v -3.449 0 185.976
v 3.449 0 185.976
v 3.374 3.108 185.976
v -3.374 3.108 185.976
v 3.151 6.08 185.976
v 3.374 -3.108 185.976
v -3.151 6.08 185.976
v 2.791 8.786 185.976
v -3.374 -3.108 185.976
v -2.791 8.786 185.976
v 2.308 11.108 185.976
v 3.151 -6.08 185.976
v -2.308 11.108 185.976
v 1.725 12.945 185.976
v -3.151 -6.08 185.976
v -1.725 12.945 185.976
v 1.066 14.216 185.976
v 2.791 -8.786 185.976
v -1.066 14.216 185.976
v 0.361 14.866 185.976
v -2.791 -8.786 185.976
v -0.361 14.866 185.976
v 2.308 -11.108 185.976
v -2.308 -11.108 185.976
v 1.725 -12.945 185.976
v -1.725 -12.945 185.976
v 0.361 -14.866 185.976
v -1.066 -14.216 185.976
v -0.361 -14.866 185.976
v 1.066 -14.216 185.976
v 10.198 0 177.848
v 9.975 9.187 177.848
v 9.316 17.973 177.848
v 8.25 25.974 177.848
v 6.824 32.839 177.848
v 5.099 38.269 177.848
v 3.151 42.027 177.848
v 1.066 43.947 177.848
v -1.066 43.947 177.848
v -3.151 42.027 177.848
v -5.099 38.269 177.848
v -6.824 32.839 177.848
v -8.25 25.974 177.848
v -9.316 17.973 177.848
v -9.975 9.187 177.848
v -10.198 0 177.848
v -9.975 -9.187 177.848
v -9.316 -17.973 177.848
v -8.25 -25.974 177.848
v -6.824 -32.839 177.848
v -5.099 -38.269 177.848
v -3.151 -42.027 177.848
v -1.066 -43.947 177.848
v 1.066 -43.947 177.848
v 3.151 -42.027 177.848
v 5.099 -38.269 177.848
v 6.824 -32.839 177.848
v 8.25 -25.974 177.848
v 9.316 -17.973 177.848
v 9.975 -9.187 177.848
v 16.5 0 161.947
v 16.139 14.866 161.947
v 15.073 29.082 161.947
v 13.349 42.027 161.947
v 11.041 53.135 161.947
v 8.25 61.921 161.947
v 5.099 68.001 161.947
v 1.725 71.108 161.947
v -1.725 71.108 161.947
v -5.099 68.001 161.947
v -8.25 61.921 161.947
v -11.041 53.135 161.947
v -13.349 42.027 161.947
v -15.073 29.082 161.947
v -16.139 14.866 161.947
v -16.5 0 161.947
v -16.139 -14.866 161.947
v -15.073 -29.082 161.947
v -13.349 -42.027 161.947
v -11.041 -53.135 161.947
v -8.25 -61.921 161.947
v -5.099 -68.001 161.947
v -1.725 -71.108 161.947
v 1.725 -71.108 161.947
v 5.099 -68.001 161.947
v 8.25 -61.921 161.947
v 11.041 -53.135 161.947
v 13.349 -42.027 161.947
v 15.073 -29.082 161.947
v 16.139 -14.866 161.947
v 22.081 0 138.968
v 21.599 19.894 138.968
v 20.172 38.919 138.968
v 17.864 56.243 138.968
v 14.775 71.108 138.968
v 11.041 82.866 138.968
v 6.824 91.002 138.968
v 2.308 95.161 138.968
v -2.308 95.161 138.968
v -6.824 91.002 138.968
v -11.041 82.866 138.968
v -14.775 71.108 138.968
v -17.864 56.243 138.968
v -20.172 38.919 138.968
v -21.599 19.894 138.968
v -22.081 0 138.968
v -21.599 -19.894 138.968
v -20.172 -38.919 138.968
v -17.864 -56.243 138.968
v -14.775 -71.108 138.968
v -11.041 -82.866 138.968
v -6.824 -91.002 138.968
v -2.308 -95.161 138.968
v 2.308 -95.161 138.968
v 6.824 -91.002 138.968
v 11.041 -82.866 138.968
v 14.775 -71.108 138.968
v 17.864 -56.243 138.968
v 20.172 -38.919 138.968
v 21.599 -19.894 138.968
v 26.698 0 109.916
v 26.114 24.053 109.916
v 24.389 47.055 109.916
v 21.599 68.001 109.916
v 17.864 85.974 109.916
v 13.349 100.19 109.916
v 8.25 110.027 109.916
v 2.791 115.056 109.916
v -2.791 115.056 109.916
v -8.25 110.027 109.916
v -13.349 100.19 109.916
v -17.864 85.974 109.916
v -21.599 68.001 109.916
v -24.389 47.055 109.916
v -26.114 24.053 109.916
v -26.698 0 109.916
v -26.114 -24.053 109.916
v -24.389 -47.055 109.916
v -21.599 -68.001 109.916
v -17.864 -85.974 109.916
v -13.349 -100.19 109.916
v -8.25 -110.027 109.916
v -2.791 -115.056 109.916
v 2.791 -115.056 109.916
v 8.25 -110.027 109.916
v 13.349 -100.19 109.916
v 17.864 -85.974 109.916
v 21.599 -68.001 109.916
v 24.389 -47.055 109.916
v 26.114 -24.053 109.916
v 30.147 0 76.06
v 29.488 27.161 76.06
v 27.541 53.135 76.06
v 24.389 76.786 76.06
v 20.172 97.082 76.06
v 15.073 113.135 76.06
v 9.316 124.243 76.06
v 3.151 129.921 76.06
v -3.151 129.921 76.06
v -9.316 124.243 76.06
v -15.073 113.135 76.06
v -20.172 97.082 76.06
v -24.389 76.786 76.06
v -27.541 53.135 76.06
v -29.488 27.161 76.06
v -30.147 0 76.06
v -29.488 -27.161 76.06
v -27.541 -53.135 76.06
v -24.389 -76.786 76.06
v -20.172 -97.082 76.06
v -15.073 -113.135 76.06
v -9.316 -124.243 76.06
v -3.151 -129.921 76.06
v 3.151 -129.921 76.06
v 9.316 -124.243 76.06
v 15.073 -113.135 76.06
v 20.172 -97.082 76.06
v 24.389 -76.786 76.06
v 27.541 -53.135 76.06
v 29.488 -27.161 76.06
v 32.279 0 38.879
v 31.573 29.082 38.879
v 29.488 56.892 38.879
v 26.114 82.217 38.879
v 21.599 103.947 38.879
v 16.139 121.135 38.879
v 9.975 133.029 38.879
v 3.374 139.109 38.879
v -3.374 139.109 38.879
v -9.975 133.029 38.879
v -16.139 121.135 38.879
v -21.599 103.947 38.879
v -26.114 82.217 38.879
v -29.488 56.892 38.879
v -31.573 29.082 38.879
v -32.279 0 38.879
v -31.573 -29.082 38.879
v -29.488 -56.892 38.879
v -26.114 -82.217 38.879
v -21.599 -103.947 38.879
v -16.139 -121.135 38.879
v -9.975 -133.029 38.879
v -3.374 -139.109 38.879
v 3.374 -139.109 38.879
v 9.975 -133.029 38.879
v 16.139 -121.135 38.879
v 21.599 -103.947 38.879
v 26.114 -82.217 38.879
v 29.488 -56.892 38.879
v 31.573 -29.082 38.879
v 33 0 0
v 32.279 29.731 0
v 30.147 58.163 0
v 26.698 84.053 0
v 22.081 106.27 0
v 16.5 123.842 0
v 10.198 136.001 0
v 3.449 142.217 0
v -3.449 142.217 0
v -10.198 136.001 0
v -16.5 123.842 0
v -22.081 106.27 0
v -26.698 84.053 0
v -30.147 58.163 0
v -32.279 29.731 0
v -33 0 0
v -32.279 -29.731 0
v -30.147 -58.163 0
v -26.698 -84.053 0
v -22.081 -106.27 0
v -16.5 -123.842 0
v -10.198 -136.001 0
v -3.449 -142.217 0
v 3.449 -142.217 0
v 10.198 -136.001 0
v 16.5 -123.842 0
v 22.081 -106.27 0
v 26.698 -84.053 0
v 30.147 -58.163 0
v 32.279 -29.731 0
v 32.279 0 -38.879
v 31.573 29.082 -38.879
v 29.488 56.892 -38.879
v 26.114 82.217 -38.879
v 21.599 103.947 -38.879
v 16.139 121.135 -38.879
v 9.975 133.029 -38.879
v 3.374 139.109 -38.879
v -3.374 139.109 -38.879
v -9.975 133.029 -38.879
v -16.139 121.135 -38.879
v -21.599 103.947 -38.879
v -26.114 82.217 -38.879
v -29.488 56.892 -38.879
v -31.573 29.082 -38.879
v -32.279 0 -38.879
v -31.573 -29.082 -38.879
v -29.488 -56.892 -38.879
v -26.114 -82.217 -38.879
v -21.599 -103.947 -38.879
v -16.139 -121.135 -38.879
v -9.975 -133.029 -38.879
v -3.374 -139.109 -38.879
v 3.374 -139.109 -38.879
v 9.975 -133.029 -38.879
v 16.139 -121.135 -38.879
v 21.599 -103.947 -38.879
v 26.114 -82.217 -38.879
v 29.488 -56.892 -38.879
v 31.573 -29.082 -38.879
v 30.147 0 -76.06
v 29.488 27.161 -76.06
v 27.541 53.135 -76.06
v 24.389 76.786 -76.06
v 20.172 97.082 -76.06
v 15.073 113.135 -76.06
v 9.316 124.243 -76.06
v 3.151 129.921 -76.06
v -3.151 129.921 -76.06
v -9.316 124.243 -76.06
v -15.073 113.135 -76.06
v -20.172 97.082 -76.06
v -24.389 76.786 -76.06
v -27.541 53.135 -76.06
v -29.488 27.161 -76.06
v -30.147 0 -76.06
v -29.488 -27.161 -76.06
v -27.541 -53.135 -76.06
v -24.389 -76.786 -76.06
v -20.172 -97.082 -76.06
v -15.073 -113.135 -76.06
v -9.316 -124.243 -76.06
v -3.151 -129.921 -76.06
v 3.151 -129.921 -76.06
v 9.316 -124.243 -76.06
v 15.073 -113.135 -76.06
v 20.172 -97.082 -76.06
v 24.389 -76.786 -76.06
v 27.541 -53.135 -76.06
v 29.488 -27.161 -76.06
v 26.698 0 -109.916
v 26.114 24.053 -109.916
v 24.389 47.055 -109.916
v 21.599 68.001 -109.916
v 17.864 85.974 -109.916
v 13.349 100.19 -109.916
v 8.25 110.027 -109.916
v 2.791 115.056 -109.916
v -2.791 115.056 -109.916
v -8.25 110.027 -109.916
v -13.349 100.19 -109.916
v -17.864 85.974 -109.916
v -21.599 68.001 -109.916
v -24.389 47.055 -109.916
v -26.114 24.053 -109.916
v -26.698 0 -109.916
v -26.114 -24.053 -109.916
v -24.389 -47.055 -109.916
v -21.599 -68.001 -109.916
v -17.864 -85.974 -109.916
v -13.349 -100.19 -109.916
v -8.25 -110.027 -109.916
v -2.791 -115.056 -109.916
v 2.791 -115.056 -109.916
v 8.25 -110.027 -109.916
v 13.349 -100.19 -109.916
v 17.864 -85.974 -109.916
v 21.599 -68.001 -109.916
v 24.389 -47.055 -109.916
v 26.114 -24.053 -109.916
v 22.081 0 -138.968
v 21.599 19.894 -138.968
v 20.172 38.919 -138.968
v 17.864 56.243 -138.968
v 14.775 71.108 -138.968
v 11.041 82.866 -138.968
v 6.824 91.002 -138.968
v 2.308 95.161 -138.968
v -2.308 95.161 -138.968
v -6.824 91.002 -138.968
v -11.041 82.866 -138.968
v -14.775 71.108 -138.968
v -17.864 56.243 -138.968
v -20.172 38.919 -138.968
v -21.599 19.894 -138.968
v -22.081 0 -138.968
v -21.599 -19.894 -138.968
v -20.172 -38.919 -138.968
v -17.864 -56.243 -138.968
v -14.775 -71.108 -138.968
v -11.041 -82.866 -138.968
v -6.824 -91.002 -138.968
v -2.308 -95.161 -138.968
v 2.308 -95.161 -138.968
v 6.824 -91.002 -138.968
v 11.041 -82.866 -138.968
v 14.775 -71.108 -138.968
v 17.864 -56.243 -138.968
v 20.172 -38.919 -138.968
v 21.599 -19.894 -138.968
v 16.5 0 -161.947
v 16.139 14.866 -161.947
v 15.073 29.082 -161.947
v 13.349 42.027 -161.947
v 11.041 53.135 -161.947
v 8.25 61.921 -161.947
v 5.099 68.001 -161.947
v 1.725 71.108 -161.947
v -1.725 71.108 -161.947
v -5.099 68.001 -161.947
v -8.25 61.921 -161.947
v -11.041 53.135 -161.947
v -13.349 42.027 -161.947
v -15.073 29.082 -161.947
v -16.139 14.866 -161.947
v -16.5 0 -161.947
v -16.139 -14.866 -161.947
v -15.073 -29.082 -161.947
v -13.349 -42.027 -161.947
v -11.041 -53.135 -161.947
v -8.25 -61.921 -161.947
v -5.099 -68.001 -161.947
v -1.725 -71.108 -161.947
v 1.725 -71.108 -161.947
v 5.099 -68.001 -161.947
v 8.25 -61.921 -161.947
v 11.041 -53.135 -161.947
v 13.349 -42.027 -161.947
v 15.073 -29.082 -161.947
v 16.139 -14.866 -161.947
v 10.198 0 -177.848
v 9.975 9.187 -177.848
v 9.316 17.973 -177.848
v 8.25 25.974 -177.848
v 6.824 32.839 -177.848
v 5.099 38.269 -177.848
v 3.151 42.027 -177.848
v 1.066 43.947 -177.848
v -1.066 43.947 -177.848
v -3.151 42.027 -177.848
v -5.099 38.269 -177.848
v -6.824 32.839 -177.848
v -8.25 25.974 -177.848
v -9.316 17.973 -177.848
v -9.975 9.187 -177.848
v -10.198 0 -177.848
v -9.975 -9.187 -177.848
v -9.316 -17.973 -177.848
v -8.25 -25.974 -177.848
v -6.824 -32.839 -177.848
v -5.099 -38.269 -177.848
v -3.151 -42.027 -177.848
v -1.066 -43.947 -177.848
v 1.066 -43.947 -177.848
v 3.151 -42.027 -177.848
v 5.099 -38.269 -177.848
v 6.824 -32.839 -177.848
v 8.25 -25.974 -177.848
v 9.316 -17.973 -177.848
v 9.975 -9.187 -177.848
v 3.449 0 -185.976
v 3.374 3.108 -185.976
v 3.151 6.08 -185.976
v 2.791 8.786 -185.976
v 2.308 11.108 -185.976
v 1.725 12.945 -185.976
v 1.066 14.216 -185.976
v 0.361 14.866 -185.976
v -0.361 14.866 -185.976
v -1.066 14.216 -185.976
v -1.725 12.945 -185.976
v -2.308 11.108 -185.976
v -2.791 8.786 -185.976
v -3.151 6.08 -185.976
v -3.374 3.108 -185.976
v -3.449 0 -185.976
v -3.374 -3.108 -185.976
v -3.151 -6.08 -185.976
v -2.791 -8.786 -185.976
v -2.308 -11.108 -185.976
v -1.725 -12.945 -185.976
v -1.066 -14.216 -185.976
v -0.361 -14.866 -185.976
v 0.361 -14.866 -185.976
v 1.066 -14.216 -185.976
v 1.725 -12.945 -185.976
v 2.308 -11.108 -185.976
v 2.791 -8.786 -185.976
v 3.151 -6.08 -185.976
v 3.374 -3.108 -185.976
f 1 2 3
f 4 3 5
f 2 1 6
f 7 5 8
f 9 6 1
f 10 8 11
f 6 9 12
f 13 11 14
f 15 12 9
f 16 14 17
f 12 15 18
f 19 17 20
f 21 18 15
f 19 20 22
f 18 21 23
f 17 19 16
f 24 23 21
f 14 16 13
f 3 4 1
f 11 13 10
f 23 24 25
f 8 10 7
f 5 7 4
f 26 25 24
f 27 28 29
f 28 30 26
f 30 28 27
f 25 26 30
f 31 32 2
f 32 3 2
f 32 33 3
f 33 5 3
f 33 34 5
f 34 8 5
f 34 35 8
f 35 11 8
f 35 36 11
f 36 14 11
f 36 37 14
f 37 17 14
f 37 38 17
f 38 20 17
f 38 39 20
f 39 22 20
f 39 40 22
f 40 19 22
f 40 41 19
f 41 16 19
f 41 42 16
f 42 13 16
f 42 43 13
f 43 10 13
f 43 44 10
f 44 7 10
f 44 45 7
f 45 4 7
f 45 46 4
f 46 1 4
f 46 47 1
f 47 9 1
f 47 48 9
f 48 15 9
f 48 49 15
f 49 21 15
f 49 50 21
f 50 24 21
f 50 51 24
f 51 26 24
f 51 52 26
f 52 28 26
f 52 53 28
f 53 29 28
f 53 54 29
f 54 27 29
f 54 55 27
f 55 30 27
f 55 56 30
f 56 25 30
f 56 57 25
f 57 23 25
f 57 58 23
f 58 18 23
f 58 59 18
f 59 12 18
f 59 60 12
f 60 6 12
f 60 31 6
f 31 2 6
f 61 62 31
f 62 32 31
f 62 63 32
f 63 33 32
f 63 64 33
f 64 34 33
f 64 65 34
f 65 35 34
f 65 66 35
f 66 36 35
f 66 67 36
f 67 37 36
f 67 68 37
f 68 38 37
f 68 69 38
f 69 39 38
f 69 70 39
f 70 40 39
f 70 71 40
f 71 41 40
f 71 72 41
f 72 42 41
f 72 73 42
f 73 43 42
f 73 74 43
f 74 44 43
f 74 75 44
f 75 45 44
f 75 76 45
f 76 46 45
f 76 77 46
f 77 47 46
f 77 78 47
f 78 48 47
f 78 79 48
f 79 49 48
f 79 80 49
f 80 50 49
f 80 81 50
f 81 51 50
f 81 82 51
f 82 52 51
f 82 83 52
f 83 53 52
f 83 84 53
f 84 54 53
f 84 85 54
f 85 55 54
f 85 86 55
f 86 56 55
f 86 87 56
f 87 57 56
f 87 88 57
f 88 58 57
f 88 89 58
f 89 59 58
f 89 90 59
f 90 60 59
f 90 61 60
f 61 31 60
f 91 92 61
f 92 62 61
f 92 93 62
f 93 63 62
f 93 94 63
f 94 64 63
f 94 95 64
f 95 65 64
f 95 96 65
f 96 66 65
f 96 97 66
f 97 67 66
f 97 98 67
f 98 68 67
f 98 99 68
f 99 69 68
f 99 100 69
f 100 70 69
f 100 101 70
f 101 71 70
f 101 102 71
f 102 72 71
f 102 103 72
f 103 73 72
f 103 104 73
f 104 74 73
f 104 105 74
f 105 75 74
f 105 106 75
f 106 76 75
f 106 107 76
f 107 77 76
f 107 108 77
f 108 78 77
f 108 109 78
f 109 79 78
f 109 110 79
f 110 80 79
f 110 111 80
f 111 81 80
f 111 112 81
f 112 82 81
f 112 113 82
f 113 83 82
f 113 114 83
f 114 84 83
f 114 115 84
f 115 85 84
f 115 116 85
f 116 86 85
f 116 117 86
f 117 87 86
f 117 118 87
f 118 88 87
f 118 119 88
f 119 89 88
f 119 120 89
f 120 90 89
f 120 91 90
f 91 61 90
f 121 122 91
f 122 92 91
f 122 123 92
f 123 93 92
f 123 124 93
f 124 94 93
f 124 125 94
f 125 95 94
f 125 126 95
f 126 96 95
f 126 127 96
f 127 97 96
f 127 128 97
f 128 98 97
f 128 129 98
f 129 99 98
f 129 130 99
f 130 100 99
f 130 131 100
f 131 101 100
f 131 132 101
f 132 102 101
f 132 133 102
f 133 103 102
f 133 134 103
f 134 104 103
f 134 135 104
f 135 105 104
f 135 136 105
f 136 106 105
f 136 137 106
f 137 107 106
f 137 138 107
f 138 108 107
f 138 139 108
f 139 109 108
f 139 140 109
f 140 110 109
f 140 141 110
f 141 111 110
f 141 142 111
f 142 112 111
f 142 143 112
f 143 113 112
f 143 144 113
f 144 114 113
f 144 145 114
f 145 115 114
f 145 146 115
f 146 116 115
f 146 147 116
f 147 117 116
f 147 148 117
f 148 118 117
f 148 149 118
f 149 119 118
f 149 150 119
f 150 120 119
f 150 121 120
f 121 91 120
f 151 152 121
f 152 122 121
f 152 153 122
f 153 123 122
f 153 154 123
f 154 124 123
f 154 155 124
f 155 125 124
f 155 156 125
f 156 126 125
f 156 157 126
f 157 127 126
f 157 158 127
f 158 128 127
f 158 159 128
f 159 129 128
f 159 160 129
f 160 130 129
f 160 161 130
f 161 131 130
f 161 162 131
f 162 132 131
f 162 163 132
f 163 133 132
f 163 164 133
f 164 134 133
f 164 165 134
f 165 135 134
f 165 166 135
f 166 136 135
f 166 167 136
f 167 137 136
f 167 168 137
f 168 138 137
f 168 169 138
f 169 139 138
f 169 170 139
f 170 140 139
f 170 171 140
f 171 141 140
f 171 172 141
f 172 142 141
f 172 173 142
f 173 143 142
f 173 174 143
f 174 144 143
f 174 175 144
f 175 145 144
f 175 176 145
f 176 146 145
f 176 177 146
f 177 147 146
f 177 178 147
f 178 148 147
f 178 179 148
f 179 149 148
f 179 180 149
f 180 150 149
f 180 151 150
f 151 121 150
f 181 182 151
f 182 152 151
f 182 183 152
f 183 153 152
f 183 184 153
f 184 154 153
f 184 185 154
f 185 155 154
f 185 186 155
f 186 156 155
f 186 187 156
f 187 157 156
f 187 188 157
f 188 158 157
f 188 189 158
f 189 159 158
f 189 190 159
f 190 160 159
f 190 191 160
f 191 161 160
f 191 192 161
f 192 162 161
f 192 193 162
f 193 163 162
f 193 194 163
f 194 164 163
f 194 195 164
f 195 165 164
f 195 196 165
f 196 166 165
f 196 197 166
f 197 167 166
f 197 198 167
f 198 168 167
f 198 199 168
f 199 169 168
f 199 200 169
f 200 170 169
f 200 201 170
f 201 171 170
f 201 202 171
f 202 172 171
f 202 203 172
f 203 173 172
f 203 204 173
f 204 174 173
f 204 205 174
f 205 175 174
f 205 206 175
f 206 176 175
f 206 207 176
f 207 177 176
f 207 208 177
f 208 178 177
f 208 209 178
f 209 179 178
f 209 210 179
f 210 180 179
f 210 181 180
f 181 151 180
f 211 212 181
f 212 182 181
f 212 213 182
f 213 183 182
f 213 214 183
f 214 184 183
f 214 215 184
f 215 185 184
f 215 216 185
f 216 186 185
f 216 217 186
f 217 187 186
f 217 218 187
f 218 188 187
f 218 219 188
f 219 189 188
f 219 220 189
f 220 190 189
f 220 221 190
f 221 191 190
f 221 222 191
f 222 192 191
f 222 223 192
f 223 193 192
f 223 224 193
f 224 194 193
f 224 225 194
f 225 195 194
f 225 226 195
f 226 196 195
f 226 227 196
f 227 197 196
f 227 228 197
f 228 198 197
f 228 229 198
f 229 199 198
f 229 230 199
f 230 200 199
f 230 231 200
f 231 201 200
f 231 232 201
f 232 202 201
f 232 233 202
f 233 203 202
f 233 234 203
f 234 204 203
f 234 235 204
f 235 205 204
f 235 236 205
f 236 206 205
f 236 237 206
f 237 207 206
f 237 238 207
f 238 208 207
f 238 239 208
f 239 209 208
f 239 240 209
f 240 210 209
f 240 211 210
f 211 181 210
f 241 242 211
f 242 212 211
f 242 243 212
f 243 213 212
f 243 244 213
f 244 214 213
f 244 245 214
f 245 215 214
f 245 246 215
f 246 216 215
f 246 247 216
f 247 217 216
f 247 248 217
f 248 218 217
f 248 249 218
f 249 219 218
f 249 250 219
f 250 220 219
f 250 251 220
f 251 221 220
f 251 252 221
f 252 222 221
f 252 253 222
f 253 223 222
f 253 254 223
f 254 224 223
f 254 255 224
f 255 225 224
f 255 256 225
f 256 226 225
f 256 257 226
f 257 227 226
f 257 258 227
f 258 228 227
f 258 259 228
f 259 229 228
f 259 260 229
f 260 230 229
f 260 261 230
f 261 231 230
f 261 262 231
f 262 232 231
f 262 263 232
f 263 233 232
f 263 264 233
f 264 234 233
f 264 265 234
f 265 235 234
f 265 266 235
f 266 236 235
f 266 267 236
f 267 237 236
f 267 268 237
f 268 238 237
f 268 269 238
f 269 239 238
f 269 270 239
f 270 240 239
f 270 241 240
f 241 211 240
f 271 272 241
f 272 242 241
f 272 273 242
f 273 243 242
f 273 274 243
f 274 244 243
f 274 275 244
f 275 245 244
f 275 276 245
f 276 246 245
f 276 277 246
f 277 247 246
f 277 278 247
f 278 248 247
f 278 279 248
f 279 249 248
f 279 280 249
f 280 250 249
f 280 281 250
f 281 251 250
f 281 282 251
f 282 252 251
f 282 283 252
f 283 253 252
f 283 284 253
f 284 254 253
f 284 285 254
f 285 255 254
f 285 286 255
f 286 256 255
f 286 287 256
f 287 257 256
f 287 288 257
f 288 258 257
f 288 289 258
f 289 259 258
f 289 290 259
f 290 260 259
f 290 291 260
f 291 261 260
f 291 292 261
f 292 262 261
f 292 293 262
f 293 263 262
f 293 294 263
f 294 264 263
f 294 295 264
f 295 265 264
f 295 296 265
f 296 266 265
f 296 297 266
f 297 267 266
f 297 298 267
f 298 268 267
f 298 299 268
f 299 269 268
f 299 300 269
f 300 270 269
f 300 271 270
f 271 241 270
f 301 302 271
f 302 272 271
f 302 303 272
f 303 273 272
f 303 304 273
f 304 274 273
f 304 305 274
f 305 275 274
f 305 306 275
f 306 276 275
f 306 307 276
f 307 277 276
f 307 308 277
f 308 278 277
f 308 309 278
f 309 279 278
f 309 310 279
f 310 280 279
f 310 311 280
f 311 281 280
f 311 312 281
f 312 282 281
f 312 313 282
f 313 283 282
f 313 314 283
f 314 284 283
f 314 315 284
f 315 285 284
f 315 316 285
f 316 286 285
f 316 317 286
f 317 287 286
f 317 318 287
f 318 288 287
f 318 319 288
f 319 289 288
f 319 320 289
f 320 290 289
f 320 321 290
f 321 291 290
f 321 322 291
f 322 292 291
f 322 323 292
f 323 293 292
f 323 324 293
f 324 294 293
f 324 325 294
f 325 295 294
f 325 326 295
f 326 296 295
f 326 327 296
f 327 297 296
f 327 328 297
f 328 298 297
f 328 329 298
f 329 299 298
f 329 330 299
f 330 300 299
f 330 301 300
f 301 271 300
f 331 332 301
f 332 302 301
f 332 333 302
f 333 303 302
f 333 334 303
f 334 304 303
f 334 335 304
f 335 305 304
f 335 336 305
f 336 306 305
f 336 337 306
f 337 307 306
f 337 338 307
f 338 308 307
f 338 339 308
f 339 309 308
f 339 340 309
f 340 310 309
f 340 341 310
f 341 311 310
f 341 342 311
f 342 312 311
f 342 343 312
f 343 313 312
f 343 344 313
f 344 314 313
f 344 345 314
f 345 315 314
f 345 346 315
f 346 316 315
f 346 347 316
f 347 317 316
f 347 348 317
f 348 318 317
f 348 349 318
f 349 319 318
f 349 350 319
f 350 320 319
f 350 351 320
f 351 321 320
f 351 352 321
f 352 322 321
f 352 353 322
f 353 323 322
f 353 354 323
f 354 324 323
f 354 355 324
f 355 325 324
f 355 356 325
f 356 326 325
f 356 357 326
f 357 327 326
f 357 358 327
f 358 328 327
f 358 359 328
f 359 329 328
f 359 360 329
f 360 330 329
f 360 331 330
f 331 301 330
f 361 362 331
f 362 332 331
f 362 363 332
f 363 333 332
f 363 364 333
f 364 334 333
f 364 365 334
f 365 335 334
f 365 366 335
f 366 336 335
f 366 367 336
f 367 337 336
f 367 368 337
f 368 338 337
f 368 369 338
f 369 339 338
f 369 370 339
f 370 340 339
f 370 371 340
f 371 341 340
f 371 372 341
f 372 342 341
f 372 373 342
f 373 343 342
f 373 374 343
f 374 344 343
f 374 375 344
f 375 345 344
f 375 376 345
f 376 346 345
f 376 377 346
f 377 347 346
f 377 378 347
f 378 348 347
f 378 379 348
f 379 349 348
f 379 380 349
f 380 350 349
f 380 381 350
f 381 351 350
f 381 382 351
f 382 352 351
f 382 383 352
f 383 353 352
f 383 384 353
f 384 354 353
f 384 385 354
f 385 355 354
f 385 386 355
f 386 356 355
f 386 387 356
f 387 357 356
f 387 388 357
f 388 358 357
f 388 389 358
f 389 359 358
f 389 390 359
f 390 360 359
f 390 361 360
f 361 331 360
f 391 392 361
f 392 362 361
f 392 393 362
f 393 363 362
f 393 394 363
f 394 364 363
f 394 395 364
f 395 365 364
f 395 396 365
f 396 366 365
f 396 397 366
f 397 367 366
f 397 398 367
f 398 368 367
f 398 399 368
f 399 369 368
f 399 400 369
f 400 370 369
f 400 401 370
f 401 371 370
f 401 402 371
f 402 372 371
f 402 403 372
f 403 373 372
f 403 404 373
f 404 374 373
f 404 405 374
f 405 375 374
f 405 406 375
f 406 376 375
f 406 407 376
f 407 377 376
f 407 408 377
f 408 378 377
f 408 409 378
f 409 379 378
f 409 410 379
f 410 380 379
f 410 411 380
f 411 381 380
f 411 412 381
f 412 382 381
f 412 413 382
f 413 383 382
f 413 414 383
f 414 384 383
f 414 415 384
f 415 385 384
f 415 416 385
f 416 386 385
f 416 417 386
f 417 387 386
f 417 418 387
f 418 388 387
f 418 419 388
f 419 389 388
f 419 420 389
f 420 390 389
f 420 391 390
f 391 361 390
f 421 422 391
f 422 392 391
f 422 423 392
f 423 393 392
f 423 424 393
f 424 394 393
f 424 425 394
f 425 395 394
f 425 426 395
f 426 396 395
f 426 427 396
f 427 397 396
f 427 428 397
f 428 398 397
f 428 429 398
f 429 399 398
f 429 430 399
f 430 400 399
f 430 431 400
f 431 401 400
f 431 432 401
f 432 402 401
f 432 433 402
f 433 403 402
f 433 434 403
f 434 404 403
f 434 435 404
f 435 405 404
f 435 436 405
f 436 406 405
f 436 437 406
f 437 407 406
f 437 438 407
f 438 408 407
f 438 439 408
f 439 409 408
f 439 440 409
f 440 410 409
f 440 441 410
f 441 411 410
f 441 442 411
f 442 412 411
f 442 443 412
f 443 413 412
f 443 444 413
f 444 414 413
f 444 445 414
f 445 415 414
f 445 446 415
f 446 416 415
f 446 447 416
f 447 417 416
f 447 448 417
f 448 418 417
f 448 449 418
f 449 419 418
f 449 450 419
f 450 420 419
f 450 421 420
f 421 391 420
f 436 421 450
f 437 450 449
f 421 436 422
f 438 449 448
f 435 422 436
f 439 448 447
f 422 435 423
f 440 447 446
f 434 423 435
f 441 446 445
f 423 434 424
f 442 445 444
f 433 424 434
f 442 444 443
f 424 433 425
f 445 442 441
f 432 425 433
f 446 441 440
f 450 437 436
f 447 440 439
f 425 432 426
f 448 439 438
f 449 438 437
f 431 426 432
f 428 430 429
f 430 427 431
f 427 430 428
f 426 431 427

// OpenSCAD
// Generated by SolidPython 1.0.1 on 2020-07-29 00:46:45


scale(v = [3, 13, 17]) {
	sphere(r = 11);
}
/***********************************************
*********      SolidPython code:      **********
************************************************
 
# import packages: SolidPython
from solid import *
from solid.utils import *
from itertools import chain, combinations, permutations


class Resize:

    def __init__(self, scad_file):
        self.scad_file = scad_file
        #self.scad_file = import_scad(scad_file)
        # cone/cylinder param:
        self.r1 = 0
        self.r2 = 0
        self.h = 0
        # rectangular prism param:
        self.w = 0
        self.l = 0
        # ellipse param:
        self.r = 0

    # import OpenScad code (file name corresponds to shape)


    # classify shape + parameters
    def assign(self, param1, param2, param3):
        if self.scad_file == 'cone.scad':
            self.r1 = param1
            self.r2 = param2
            self.h = param3
        elif self.scad_file == 'cylinder.scad':
            self.r1 = param1
            self.r2 = param2
            self.h = param3
        elif self.scad_file == 'rectangularPrism.scad':
            self.h = param1
            self.l = param2
            self.w = param3
        else:
            self.r = param1
            self.h = param2

    # resize parameters
    def iterate(self):
        x = range(3, 20, 2)
        i = 1
        if self.scad_file == 'cone.scad':
            tempList = list(permutations(x, 2))
            for temp in tempList:
                param1 = temp[0]
                param2 = temp[1]
                filepath = 'produced_scad_files/' + 'cone' + str(param1) + '_' + str(param2) + '_' + '.scad'
                scad_render_to_file(cylinder(h=param1, r1=param2, r2=0), filepath)

        elif self.scad_file == 'cylinder.scad':
            tempList = list(permutations(x, 3))
            for temp in tempList:
                param1 = temp[0]
                param2 = temp[1]
                filepath = 'produced_scad_files/' + 'cylinder' + str(param1) + '_' + str(param2) + '_' + '.scad'
                scad_render_to_file(cylinder(h=param1, r1=param2, r2=param2), filepath)

        elif self.scad_file == 'rectangularPrism.scad':
            tempList = list(permutations(x, 3))
            for temp in tempList:
                param1 = temp[0]
                param2 = temp[1]
                param3 = temp[2]
                filepath = 'produced_scad_files/' + 'rectangularPrism' + str(param1) + '_' + str(param2) + '_' + str(
                    param3) + '.scad'
                scad_render_to_file(cube(size=(param1, param2, param3)), filepath)

        elif self.scad_file == 'ellipse.scad':
            tempList = list(permutations(x, 4))
            for temp in tempList:
                param1 = temp[0]
                param2 = temp[1]
                param3 = temp[2]
                param4 = temp[3]
                filepath = 'produced_scad_files/' + 'ellipse' + str(param1) + '_' + str(param2) + '_' + str(param3) + '_' + str(param4) + '.scad'
                scad_render_to_file(scale([param1, param2, param3])(sphere(r=param4)), filepath)

    def render_to_scadfile(self):
        scad_render_to_file(scad, 'example.scad') 
 
************************************************/
